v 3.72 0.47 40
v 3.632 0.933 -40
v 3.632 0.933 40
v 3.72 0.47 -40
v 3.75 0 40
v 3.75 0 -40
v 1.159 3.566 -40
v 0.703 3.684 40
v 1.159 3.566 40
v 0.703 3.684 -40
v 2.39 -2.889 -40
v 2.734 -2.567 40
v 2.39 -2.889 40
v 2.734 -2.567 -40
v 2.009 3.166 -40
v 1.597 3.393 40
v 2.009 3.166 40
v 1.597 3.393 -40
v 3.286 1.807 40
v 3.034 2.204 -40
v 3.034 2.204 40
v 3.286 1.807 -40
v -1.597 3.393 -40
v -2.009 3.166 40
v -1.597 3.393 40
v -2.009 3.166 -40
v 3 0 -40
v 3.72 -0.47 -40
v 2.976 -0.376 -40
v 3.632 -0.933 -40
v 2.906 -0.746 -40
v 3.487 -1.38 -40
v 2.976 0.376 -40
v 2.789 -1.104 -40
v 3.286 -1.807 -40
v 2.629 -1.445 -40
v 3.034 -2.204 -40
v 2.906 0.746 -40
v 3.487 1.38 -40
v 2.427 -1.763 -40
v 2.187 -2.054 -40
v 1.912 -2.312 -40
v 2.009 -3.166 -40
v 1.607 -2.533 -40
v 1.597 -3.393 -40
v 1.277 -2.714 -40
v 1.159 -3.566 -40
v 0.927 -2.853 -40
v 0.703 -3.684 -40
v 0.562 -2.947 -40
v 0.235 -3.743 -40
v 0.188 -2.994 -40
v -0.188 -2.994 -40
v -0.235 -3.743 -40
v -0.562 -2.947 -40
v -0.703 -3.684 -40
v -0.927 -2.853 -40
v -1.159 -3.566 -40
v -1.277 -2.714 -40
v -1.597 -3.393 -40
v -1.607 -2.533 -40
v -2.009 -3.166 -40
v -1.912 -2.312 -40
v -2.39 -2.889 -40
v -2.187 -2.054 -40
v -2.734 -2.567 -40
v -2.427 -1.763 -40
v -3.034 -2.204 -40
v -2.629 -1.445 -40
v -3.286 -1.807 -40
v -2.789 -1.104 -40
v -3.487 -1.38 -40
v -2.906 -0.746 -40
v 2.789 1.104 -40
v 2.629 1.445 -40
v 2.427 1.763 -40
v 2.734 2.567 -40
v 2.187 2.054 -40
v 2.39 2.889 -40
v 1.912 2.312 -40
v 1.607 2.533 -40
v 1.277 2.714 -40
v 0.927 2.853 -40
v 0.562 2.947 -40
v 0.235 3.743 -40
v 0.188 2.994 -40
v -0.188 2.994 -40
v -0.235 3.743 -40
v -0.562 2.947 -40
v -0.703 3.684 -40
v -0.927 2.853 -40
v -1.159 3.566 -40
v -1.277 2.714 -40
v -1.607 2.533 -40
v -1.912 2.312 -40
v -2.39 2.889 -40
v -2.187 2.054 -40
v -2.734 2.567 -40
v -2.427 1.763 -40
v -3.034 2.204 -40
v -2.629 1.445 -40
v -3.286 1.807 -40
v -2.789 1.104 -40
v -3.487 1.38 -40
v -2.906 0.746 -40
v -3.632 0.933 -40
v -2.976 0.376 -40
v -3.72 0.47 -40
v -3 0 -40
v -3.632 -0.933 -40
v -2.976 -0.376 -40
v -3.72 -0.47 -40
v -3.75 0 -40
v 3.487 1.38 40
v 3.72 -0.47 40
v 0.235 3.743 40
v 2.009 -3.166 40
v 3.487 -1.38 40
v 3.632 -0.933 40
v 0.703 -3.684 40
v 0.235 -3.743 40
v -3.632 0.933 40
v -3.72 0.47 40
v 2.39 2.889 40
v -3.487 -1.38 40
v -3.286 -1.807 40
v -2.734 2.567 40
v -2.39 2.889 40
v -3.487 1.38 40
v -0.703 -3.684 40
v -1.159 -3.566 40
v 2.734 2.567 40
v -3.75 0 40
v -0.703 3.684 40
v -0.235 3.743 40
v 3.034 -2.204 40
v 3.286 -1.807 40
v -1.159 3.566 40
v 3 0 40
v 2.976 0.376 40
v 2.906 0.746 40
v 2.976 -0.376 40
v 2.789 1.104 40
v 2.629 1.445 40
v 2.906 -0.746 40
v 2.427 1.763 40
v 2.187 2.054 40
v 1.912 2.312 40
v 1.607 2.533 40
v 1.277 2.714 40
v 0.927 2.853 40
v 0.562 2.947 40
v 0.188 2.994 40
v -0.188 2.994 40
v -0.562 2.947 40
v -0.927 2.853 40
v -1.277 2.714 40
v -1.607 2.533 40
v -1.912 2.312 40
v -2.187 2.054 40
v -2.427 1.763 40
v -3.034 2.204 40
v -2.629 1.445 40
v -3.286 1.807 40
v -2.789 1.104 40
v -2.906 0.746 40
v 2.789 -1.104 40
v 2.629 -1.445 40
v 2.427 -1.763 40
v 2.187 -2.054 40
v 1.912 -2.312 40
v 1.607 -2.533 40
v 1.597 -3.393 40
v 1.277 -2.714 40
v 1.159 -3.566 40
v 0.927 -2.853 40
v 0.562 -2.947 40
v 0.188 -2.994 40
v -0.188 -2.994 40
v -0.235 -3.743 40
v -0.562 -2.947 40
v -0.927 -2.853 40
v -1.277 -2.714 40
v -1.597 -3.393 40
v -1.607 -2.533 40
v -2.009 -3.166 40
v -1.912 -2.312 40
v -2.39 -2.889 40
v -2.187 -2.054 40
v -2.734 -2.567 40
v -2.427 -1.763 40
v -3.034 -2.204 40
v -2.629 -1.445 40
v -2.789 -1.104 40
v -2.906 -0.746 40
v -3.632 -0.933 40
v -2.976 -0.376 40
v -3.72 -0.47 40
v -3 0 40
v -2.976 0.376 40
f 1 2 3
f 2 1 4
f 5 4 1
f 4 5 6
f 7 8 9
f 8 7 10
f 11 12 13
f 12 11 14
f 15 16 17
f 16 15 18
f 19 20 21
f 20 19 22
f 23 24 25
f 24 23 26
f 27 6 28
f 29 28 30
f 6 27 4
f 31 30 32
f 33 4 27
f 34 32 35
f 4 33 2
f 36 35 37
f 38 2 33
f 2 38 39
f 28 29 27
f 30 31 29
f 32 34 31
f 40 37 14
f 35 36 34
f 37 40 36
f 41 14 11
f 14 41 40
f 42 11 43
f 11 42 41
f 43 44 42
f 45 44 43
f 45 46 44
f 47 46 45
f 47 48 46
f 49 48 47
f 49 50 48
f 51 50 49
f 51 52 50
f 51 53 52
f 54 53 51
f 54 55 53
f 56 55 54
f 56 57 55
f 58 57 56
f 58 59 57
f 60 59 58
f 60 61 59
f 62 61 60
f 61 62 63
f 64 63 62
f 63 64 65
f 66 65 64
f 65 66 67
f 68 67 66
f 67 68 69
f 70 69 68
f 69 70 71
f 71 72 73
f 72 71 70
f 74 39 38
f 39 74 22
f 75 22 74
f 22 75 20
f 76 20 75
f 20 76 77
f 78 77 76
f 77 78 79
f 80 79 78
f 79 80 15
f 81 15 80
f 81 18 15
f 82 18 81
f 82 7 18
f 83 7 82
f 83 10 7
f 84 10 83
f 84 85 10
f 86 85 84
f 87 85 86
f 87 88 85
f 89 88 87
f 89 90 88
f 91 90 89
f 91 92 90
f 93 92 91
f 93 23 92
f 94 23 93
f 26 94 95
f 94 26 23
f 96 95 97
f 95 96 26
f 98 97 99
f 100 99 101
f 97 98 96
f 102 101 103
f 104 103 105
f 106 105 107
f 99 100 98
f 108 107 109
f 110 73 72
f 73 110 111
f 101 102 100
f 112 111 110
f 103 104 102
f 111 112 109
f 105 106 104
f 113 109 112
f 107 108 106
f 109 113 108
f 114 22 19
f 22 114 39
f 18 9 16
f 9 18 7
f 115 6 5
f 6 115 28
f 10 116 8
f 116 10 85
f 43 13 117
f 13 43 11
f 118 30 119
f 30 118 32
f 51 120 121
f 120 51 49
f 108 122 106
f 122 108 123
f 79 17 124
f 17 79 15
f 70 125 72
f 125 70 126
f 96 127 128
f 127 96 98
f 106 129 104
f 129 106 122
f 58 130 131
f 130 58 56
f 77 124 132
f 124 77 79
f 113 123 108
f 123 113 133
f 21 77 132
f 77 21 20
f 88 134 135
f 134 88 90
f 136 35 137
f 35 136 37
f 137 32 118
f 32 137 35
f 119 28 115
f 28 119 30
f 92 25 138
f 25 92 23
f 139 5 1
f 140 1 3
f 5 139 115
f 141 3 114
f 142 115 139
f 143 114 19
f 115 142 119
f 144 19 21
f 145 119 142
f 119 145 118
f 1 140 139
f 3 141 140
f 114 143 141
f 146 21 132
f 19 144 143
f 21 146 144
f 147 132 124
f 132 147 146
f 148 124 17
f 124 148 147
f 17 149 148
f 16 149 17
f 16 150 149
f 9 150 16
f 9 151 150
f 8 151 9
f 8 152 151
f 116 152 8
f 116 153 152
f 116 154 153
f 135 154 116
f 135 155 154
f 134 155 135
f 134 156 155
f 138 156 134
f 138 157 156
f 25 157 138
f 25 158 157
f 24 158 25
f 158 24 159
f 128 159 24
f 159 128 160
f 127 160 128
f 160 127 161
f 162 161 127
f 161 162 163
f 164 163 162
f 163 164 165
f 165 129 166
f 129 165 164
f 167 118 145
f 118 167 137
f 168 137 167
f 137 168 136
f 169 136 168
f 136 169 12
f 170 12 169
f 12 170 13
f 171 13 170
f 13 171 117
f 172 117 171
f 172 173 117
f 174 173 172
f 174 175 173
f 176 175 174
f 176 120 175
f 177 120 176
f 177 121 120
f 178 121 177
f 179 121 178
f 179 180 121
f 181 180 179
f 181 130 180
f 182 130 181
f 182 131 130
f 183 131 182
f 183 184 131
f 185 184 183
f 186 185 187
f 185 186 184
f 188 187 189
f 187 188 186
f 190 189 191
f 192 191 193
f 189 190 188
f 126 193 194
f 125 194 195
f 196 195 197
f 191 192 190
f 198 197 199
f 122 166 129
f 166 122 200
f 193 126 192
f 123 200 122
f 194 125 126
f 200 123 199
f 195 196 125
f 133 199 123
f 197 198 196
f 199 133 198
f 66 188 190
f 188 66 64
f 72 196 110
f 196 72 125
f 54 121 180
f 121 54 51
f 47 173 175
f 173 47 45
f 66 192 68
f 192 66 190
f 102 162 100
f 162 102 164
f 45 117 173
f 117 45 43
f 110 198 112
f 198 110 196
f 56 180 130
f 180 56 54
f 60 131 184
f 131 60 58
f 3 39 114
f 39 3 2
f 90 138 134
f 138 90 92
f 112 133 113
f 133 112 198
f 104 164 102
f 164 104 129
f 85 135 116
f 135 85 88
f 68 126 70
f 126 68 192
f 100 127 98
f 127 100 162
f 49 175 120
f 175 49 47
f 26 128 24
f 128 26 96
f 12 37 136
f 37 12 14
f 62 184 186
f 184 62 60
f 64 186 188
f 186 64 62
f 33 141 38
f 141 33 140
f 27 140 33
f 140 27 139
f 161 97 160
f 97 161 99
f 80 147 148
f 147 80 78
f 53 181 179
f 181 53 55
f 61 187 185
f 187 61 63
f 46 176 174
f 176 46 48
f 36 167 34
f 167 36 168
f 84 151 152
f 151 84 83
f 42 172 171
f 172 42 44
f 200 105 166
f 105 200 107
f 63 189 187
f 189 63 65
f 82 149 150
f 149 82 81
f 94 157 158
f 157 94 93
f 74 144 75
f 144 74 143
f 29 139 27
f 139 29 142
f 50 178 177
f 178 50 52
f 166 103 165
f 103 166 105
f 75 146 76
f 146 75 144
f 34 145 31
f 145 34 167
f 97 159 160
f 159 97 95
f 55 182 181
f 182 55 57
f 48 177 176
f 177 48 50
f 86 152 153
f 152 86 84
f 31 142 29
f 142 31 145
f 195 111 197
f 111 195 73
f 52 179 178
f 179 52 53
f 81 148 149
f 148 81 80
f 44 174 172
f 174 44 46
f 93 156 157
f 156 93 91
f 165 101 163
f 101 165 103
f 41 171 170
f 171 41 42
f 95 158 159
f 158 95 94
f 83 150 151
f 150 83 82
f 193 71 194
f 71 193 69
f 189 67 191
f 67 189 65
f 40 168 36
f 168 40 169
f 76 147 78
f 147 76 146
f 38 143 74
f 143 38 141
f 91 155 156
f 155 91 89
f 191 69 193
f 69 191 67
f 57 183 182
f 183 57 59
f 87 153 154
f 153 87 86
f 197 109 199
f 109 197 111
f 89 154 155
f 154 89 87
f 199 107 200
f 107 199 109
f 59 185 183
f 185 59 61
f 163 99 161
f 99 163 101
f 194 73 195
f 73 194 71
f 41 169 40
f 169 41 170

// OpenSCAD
$fn = 50;


difference() {
	union() {
		translate(v = [0, 0, -40.0000000000]) {
			cylinder(h = 80, r = 3.7500000000);
		}
	}
	union() {
		translate(v = [0, 0, -100.0000000000]) {
			cylinder(h = 200, r = 3.0000000000);
		}
	}
}
